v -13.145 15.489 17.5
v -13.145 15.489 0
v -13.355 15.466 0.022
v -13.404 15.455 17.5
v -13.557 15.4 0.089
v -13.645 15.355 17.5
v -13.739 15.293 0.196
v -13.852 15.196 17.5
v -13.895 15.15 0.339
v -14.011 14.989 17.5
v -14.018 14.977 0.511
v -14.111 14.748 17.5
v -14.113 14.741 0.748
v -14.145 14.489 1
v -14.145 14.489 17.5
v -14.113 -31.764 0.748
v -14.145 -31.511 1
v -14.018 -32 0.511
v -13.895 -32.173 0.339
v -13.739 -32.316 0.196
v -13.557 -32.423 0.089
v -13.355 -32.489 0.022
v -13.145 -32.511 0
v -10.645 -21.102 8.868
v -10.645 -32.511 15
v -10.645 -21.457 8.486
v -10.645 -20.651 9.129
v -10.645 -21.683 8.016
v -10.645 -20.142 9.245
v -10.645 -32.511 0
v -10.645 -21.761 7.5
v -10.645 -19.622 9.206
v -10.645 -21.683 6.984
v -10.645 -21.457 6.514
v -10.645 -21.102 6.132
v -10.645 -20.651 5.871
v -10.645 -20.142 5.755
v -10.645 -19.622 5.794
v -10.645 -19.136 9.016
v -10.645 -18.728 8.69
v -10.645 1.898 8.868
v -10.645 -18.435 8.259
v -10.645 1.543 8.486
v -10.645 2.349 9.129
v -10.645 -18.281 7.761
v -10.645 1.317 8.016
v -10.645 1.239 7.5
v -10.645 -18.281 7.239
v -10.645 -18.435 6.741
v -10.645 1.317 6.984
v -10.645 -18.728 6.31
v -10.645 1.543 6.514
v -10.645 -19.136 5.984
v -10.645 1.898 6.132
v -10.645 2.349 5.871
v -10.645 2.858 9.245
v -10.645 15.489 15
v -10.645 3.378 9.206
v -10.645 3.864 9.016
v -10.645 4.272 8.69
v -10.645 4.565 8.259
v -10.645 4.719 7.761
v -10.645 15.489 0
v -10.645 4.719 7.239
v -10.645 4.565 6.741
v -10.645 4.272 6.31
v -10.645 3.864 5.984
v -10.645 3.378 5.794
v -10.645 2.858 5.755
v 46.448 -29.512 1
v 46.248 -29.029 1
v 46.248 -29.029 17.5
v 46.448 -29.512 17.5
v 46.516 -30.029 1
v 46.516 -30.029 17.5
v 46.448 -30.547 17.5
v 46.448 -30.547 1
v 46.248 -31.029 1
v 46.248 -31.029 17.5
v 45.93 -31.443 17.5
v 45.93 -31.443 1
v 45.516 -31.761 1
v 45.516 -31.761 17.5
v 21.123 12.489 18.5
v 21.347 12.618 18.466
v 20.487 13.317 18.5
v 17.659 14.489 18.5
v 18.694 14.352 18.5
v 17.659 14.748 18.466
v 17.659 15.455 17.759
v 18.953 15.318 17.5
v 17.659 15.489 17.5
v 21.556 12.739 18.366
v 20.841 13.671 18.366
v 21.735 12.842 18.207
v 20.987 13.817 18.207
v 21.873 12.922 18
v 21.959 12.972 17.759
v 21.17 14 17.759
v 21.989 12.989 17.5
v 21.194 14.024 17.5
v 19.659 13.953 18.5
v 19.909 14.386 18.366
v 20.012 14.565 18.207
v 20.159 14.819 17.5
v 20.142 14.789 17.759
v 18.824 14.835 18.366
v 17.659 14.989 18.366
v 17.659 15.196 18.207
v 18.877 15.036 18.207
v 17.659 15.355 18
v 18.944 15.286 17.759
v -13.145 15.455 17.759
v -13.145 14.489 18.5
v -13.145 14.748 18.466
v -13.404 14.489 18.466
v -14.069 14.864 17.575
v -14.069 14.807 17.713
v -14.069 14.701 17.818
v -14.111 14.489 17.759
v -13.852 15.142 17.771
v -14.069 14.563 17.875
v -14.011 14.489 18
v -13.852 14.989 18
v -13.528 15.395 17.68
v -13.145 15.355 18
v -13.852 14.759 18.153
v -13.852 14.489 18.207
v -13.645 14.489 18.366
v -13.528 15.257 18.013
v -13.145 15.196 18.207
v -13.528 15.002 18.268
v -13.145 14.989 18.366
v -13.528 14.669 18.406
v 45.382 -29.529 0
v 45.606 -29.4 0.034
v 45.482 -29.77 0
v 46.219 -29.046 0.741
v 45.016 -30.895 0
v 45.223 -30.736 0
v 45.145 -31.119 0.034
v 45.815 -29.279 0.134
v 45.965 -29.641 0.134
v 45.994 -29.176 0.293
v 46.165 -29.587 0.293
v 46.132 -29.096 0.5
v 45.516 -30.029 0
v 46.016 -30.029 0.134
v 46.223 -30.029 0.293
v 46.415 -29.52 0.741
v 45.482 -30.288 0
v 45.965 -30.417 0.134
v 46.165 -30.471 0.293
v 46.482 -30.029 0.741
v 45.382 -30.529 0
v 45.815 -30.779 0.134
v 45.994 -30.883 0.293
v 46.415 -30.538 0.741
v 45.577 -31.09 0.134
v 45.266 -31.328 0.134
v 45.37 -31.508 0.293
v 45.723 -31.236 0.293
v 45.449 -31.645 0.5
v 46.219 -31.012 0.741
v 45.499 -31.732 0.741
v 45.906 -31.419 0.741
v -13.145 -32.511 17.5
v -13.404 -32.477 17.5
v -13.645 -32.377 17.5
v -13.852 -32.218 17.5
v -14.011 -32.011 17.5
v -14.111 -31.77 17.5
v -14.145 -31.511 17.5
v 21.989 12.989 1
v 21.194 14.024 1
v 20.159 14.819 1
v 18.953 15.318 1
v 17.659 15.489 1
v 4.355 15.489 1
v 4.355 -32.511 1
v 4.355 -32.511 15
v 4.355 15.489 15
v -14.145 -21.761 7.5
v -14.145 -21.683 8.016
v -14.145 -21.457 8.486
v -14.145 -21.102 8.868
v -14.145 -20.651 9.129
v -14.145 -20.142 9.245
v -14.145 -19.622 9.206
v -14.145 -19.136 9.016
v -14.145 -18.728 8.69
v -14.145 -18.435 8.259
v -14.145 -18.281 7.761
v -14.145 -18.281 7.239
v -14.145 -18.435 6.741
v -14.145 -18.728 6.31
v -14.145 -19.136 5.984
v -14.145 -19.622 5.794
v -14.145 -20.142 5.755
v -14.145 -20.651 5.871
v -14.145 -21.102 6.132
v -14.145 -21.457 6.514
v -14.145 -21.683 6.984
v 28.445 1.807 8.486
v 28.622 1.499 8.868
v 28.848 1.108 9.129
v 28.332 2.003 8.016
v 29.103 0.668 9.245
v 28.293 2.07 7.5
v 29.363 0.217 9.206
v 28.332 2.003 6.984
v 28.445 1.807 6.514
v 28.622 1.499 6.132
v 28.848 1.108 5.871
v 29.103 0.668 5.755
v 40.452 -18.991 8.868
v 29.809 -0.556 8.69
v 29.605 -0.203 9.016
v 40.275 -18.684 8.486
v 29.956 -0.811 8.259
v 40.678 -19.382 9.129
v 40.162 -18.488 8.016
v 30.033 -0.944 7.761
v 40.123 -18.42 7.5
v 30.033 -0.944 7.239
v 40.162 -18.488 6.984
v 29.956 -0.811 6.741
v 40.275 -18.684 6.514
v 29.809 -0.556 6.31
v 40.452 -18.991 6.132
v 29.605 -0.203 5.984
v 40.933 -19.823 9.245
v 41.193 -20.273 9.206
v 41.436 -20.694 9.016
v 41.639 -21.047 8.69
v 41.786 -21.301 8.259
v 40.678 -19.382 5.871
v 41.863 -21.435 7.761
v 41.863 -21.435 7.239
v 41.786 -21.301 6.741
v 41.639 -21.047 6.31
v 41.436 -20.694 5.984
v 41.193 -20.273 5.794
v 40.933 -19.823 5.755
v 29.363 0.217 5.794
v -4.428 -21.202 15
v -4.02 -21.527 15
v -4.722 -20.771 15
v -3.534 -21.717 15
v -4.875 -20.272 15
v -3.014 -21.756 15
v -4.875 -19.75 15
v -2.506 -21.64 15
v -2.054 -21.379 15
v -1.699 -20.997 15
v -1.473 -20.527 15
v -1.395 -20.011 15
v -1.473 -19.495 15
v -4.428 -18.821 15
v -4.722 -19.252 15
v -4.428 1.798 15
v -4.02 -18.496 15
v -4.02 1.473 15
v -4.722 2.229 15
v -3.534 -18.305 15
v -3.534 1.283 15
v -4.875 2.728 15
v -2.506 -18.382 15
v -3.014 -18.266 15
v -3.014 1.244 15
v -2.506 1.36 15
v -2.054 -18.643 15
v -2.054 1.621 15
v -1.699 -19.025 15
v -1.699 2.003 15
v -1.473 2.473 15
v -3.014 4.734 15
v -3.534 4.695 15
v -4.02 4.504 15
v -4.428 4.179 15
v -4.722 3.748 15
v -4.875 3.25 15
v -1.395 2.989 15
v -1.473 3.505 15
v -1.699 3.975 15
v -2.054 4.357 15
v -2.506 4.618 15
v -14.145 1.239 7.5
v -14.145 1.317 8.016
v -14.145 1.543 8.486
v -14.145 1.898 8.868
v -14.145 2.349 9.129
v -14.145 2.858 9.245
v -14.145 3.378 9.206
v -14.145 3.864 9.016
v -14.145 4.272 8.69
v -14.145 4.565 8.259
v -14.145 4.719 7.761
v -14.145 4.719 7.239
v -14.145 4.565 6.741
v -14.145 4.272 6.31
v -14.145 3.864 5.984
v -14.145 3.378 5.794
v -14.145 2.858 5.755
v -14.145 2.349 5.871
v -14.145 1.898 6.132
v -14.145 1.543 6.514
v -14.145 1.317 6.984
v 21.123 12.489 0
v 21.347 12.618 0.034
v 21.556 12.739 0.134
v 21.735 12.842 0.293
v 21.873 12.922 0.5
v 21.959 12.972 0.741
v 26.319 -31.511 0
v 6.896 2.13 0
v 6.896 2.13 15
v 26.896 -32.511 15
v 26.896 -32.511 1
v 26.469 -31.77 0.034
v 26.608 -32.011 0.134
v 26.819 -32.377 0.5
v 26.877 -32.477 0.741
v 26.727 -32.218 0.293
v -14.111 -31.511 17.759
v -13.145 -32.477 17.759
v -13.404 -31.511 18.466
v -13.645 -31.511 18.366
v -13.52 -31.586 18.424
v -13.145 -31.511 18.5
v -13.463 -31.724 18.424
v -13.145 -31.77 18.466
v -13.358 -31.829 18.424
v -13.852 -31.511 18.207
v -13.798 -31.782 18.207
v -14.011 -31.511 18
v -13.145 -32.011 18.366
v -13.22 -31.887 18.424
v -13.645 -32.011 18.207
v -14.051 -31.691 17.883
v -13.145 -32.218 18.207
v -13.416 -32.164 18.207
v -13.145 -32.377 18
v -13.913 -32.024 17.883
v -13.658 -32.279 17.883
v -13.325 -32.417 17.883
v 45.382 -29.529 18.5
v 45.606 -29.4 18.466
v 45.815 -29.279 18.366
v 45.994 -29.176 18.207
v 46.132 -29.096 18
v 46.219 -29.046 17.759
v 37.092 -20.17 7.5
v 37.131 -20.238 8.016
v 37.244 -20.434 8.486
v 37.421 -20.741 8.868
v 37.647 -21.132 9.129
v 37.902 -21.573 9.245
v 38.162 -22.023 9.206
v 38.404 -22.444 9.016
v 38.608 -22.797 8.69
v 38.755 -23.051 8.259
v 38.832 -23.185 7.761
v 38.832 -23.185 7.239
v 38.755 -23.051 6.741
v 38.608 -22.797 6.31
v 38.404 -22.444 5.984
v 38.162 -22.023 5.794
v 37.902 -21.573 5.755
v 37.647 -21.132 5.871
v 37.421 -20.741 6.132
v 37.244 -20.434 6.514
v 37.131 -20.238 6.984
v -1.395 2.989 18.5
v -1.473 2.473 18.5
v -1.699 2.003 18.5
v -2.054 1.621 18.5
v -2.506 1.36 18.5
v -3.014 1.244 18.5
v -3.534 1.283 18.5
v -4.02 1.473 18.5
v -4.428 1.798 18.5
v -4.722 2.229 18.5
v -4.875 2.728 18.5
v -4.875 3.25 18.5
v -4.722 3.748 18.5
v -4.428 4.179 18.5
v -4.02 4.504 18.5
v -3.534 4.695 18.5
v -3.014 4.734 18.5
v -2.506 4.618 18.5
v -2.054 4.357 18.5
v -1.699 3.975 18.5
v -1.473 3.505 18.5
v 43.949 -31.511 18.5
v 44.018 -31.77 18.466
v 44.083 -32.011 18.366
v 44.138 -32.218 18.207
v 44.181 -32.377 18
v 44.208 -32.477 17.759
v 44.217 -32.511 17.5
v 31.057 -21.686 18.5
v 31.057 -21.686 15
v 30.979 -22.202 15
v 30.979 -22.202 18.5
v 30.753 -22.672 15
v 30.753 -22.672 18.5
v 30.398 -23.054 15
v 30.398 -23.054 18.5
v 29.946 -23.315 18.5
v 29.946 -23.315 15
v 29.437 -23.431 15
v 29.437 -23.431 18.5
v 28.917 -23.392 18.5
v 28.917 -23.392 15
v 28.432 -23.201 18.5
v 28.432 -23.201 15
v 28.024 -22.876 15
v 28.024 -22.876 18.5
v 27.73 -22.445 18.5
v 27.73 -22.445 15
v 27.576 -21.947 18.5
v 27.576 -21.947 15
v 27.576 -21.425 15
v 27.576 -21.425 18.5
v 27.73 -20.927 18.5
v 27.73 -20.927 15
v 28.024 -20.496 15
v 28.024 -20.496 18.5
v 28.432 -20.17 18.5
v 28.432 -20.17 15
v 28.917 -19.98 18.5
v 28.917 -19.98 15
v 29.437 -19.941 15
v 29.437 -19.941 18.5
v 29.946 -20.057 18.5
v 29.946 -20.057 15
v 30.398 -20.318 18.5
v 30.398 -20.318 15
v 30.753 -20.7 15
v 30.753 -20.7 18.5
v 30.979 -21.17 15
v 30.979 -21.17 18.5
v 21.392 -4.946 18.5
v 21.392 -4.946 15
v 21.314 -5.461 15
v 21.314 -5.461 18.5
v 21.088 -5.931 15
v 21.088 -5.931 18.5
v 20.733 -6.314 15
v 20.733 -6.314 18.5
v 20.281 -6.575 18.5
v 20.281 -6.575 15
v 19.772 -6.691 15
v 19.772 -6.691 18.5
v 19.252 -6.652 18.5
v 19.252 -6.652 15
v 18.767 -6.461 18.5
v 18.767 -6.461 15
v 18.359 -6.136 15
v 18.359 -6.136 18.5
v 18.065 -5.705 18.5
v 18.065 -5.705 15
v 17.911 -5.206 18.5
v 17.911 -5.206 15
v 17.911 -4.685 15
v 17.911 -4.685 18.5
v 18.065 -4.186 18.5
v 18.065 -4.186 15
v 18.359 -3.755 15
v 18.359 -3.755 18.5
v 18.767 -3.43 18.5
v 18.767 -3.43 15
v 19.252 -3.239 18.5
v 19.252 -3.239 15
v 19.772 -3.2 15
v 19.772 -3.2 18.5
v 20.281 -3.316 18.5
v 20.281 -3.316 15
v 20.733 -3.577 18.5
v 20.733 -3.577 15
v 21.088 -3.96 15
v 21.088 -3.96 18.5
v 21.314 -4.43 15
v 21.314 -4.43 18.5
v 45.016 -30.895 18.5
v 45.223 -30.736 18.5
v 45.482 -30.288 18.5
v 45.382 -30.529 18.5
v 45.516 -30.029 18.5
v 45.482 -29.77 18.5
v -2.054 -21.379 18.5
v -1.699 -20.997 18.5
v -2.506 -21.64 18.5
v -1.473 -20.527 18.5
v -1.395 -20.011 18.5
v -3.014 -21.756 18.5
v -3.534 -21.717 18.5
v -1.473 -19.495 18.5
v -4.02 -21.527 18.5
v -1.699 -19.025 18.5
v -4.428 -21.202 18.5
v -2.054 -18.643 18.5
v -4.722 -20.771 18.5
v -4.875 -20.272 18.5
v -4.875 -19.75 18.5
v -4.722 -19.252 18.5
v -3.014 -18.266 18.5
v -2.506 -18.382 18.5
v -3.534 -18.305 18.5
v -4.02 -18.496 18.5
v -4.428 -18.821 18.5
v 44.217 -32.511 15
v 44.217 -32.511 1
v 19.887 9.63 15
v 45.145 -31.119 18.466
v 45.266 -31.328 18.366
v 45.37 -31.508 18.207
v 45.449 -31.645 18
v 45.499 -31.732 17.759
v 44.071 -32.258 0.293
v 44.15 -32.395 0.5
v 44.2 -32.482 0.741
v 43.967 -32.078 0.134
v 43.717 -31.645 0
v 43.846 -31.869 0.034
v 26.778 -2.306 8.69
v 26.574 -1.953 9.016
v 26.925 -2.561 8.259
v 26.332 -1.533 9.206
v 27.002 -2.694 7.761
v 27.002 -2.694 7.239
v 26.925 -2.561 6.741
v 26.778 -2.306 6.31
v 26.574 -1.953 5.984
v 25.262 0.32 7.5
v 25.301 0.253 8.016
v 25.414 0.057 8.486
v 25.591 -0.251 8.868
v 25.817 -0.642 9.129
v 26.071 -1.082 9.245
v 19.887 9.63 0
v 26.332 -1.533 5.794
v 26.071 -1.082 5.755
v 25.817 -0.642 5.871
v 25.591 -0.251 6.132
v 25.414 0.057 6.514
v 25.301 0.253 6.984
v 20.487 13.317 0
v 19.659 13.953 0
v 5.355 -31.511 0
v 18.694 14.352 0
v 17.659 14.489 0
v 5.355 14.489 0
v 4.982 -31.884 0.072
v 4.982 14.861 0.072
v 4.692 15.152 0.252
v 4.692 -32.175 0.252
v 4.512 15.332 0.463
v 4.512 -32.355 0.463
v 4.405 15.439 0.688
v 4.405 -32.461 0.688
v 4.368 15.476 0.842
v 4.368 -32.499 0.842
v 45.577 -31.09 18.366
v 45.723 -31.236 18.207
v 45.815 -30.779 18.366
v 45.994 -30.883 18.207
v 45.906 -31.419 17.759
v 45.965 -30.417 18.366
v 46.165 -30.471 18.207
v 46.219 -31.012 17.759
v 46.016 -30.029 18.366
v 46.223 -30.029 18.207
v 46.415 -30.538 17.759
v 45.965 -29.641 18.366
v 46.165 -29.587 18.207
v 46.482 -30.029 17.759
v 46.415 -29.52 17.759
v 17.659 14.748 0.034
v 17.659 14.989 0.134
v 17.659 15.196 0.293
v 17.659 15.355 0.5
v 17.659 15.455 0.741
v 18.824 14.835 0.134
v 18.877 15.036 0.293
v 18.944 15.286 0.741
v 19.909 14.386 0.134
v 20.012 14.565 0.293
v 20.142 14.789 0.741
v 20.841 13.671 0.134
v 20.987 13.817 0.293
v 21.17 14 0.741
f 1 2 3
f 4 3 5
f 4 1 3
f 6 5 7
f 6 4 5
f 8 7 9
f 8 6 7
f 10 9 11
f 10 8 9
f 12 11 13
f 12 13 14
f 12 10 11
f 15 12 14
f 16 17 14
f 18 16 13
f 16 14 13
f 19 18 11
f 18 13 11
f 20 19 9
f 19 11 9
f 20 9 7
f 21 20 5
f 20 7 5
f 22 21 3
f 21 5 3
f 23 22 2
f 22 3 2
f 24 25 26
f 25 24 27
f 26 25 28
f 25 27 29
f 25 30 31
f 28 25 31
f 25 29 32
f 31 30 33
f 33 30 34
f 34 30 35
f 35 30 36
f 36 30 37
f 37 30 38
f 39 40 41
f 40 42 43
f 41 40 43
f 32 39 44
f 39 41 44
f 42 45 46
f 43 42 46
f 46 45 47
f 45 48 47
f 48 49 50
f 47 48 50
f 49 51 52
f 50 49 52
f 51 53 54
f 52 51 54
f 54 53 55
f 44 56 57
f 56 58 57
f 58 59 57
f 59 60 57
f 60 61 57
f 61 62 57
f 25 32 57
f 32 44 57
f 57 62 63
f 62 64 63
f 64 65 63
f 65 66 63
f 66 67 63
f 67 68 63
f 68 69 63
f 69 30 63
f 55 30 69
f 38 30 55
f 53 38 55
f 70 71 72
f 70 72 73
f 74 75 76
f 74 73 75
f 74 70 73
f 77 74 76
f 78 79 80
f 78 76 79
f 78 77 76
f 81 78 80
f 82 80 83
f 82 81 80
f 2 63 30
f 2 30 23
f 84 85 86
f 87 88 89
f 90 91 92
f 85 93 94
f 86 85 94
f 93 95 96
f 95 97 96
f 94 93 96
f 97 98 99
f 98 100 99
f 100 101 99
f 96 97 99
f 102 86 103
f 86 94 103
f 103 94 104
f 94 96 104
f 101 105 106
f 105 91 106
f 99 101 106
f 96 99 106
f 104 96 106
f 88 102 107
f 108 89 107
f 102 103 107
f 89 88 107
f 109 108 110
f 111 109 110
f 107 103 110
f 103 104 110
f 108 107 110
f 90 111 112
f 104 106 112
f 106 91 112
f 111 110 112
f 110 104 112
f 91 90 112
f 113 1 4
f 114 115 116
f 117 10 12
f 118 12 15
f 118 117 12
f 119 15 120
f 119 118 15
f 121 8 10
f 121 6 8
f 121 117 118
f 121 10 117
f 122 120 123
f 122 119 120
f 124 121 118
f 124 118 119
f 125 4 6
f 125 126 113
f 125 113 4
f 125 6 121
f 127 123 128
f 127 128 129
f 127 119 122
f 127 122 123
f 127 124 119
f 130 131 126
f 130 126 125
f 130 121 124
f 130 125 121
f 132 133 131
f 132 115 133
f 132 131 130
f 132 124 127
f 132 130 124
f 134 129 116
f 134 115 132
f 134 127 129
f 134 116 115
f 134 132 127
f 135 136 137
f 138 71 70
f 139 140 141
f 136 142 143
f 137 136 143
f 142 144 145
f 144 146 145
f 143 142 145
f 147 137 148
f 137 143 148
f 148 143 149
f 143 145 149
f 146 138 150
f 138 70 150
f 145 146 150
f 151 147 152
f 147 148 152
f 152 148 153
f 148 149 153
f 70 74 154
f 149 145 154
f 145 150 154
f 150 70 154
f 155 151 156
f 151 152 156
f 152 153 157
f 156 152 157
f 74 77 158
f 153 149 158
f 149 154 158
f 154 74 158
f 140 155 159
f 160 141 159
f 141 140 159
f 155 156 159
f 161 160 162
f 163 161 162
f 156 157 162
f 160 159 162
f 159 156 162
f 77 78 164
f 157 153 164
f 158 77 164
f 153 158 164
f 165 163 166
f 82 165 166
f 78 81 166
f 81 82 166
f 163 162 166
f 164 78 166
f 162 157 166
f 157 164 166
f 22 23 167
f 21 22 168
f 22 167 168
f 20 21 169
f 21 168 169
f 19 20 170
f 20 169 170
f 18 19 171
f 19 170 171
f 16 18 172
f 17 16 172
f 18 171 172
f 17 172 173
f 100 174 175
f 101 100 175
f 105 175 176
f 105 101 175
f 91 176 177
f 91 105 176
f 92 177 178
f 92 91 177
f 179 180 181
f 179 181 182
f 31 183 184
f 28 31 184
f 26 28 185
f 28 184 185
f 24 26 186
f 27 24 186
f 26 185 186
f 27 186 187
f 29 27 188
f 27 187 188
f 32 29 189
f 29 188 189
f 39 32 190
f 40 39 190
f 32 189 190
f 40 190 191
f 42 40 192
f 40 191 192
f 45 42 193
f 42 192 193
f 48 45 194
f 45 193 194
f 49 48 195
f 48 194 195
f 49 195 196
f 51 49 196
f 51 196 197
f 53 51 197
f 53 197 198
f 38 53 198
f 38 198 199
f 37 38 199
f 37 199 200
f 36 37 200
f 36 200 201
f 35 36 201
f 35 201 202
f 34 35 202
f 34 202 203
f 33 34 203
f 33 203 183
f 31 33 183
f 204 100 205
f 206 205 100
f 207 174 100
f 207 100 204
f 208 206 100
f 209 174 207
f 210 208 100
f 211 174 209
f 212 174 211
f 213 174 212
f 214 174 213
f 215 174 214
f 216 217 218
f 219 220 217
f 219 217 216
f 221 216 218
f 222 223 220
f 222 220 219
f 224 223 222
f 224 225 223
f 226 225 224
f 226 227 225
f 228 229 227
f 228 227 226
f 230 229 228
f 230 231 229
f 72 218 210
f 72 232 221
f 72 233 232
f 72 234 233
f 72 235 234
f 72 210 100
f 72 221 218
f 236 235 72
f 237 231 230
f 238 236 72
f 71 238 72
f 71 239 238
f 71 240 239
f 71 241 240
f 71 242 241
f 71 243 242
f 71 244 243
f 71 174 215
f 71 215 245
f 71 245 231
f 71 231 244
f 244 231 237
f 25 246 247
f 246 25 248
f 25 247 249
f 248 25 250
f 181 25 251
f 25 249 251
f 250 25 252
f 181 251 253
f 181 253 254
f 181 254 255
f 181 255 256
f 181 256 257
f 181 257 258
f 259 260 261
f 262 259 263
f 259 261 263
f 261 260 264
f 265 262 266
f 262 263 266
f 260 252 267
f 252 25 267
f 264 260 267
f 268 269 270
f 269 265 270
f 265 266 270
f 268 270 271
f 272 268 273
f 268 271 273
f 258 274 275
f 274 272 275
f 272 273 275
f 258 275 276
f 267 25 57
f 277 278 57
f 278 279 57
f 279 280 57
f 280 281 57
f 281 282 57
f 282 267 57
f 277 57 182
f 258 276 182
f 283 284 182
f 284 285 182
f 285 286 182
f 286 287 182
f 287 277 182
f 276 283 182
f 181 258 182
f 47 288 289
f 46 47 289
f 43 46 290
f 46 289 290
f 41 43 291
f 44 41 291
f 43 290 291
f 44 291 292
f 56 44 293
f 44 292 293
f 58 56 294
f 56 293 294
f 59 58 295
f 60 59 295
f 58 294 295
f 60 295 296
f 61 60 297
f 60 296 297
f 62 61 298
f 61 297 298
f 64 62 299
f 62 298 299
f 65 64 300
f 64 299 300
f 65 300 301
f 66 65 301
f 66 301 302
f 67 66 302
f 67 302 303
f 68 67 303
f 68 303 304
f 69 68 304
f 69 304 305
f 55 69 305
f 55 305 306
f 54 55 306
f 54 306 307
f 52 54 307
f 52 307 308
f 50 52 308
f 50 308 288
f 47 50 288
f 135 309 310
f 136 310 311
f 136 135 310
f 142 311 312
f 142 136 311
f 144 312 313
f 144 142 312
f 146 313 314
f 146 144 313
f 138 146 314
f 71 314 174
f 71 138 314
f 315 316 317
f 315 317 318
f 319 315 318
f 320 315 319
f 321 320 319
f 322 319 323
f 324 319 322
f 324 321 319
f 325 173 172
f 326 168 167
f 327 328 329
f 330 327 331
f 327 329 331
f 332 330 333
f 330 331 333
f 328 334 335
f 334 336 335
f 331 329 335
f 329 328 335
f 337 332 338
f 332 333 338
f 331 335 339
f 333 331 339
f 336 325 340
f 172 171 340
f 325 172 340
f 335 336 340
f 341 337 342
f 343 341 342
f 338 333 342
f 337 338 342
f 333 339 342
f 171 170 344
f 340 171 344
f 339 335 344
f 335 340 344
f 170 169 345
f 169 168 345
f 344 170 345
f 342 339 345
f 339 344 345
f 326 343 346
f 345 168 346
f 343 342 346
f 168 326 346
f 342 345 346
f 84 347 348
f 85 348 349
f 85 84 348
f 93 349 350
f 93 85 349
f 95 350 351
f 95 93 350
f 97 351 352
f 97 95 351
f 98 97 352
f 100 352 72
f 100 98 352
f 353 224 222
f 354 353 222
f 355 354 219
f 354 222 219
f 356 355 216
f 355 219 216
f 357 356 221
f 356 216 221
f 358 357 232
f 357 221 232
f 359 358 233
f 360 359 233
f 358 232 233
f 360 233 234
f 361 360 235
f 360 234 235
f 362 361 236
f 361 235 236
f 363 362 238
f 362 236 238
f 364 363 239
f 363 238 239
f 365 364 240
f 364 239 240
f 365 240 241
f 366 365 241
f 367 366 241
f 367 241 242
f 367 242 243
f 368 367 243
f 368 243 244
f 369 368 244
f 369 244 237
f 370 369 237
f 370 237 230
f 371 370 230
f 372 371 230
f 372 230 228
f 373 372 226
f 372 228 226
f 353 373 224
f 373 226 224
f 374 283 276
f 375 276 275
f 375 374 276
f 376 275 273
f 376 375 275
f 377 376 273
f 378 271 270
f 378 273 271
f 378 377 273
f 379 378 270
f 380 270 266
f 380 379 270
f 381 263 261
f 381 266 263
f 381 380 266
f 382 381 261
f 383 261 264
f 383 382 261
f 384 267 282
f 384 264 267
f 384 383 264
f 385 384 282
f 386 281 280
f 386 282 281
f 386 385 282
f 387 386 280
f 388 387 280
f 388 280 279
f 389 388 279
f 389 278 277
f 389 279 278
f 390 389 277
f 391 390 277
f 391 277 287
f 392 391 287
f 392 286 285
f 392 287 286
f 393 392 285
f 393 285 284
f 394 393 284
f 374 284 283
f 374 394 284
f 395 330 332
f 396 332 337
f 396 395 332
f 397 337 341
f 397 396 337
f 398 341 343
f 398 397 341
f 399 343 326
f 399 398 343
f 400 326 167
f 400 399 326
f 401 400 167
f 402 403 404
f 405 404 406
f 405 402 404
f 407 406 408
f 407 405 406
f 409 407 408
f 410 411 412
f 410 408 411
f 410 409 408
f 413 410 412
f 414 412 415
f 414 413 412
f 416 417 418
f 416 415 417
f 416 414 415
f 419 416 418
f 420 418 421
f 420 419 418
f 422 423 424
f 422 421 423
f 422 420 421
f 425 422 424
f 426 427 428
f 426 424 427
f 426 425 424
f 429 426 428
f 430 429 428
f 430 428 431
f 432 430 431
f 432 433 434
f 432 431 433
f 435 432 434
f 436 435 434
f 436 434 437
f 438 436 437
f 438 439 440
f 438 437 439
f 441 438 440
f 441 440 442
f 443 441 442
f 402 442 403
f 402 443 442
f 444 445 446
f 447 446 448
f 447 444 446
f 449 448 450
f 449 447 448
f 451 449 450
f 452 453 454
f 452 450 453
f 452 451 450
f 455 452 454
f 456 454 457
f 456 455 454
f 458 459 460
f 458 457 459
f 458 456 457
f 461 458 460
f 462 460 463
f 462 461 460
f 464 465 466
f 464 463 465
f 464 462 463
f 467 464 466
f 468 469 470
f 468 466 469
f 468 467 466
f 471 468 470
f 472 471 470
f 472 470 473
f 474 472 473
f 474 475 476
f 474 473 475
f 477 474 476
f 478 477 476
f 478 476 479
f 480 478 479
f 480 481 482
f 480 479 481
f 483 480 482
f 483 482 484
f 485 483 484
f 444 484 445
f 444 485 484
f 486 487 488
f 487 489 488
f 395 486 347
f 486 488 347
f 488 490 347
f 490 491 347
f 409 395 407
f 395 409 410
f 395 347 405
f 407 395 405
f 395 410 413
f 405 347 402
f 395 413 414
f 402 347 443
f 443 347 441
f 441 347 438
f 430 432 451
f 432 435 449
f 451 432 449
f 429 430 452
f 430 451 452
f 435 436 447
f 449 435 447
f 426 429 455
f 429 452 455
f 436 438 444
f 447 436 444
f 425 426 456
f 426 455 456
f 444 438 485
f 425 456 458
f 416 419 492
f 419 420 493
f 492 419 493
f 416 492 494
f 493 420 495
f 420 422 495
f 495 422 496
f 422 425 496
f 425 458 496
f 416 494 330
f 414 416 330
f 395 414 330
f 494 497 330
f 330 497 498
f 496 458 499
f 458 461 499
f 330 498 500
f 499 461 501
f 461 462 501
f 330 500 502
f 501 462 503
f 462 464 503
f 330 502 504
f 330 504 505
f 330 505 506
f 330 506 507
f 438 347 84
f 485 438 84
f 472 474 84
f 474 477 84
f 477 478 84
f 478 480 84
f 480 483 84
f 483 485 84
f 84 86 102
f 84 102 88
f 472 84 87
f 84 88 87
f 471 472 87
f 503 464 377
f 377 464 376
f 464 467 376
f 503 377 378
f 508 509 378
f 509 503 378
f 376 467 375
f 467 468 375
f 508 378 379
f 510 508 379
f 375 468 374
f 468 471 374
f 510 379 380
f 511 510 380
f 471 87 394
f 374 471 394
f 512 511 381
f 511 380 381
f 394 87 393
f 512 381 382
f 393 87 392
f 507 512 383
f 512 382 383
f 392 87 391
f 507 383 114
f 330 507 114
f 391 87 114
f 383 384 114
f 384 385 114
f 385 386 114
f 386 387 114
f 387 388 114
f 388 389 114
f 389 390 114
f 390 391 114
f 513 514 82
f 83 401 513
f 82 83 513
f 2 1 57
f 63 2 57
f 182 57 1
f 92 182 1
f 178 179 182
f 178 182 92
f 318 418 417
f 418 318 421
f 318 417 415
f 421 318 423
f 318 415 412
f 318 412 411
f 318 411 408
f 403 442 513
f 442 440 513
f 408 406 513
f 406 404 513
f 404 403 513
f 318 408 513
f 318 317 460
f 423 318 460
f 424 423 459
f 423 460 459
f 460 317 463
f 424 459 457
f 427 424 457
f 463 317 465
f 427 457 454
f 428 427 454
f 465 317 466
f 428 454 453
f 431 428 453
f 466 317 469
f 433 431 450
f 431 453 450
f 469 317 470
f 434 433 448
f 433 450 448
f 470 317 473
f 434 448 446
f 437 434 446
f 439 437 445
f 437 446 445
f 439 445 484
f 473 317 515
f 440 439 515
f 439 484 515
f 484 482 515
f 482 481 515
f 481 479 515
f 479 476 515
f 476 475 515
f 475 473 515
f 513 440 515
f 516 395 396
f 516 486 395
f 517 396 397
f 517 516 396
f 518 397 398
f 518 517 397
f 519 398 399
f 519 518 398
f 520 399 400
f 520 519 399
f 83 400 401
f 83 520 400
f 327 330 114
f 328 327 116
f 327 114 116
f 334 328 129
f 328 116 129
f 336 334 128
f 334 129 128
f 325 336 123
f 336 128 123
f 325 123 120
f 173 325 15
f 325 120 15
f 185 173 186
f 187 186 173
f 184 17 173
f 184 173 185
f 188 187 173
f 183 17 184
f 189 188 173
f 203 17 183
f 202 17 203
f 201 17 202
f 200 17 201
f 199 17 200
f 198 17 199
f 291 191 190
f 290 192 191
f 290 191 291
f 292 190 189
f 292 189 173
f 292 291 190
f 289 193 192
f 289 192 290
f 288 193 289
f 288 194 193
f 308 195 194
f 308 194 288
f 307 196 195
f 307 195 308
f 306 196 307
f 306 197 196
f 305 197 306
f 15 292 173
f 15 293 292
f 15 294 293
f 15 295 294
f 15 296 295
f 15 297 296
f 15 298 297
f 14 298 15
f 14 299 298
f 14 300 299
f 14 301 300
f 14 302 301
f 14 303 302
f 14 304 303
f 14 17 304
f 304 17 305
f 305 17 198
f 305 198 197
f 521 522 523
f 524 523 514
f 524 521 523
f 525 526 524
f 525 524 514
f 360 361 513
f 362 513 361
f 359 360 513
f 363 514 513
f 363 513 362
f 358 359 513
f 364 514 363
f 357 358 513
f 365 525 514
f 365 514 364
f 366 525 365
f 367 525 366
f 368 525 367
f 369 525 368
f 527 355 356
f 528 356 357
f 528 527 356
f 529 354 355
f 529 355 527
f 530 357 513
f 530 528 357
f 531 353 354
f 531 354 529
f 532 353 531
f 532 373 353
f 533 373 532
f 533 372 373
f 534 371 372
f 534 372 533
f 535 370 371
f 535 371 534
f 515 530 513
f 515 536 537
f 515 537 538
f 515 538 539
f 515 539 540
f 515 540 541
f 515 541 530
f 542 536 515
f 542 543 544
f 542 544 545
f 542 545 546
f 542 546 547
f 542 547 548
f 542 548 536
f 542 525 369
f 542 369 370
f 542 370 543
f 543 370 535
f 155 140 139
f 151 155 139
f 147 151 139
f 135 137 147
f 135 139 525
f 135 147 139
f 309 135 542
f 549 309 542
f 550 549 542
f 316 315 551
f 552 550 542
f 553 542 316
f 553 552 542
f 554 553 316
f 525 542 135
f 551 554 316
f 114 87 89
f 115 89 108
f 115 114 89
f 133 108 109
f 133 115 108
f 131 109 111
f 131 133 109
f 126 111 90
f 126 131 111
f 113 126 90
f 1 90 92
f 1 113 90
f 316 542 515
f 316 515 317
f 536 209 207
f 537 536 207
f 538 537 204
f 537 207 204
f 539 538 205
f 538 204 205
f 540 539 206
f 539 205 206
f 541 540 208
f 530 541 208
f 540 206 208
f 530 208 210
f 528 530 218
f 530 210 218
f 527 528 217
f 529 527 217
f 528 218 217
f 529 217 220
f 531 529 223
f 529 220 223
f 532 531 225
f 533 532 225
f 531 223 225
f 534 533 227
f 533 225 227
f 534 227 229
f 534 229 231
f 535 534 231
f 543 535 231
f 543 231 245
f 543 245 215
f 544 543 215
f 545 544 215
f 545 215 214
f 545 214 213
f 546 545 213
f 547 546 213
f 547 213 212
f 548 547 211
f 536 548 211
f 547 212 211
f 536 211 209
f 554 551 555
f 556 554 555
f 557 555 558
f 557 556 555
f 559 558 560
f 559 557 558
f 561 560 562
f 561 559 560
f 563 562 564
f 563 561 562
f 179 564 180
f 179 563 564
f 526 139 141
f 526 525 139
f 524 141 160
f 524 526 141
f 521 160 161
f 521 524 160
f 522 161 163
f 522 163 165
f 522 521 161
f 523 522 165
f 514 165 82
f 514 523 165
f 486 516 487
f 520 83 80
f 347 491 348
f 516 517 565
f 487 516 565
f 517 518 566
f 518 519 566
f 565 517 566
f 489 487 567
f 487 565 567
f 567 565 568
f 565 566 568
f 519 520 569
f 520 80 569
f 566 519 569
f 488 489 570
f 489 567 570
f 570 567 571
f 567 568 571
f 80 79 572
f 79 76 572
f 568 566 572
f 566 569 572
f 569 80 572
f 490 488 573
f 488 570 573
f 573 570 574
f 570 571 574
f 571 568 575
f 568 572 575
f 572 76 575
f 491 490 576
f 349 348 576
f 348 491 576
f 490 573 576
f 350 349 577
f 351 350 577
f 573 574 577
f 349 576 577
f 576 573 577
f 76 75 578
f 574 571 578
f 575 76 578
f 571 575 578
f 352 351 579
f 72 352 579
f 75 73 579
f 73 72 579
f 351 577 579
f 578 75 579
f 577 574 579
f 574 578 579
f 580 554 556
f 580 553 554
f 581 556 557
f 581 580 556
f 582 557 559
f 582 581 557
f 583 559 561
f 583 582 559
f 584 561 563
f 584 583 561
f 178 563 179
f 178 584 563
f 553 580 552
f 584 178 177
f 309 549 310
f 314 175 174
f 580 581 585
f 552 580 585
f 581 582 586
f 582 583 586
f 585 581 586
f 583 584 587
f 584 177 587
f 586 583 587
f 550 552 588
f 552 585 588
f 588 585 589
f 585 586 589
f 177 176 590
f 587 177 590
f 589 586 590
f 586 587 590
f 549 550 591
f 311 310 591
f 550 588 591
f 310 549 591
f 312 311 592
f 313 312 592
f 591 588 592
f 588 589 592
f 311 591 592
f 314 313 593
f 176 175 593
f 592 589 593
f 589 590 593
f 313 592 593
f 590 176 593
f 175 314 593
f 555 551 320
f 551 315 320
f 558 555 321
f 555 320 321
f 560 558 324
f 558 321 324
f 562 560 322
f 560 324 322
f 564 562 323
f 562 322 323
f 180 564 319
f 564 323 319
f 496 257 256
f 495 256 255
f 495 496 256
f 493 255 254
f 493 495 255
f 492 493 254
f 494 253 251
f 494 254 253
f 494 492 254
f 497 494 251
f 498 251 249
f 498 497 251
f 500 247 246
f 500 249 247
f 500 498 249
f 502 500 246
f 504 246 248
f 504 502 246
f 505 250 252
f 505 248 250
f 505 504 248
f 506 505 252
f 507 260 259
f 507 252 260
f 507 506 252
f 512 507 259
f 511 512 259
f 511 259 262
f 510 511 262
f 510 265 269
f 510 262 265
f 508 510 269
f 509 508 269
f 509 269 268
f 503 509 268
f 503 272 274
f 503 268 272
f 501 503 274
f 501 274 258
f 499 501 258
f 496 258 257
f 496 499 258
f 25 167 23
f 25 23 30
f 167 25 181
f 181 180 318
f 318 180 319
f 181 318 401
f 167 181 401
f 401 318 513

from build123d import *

# Parameters (mm, degrees)
BOSS_EXTRUDE1_DEPTH = 18.5
SKETCH2_W           = 15
SKETCH2_H           = 48
CUT_EXTRUDE1_DEPTH  = 15
SKETCH3_R           = 1.75
CUT_EXTRUDE2_DEPTH  = 3.5
SKETCH4_R           = 1.75
CUT_EXTRUDE3_DEPTH  = 4
SKETCH5_R           = 1.75
CUT_EXTRUDE4_DEPTH  = 4
CUT_EXTRUDE5_DEPTH  = 19
FILLET1_R           = 2
FILLET2_R           = 5
FILLET3_R           = 1


with BuildPart() as part:
    # Sketch1 → Boss-Extrude1 (new body)
    with BuildSketch(Plane.XY):
        Polygon((20.545588903, 15.488794989), (48.258401824, -32.511205011), (7.85498998, -32.511205011), (-14.14501002, -32.511205011), (-14.14501002, 15.488794989), align=None)
    extrude(amount=BOSS_EXTRUDE1_DEPTH)

    # Sketch2 → Cut-Extrude1 (cut)
    with BuildSketch(Plane.XY):
        with Locations((-3.14501002, -8.511205011)):
            Rectangle(SKETCH2_W, SKETCH2_H)
        Polygon((44.21694994, -32.511205011), (19.886822921, 9.62981114), (6.896441864, 2.12981114), (26.896441864, -32.511205011), align=None)
    extrude(amount=CUT_EXTRUDE1_DEPTH, mode=Mode.SUBTRACT)

    # Sketch3 → Cut-Extrude2 (cut)
    with BuildSketch(Plane(origin=(22.116036645, 12.76869971, 0), x_dir=(0, 0, -1), z_dir=(0.8660254037844378, 0.5000000000000016, 0))):
        with Locations(Location((-7.5, -37.764004417, 0), (0, 0, 90))):
            Circle(SKETCH3_R)
        with Locations(Location((-7.5, -14.103750379, 0), (0, 0, 90))):
            Circle(SKETCH3_R)
    extrude(amount=-CUT_EXTRUDE2_DEPTH, mode=Mode.SUBTRACT)

    # Sketch4 → Cut-Extrude3 (cut)
    with BuildSketch(Plane(origin=(0, 0, 18.5), x_dir=(-1, 0, 0), z_dir=(0, 0, -1))):
        with Locations(Location((-29.306695902, -21.685887464, 0), (0, 0, 180))):
            Circle(SKETCH4_R)
        with Locations(Location((-19.641632393, -4.945506407, 0), (0, 0, 180))):
            Circle(SKETCH4_R)
        with Locations(Location((3.14501002, 2.988794989, 0), (0, 0, 180))):
            Circle(SKETCH4_R)
        with Locations(Location((3.14501002, -20.011205011, 0), (0, 0, 180))):
            Circle(SKETCH4_R)
    extrude(amount=CUT_EXTRUDE3_DEPTH, mode=Mode.SUBTRACT)

    # Sketch5 → Cut-Extrude4 (cut)
    with BuildSketch(Plane.ZY.offset(14.14501002)):
        with Locations(Location((7.5, -20.011205011, 0), (0, 0, 270))):
            Circle(SKETCH5_R)
        with Locations(Location((7.5, 2.988794989, 0), (0, 0, 270))):
            Circle(SKETCH5_R)
    extrude(amount=-CUT_EXTRUDE4_DEPTH, mode=Mode.SUBTRACT)

    # Sketch6 → Cut-Extrude5 (cut)
    with BuildSketch(Plane.XY.offset(18.5)):
        Polygon((44.21694994, -32.511205011), (47.248038853, -30.761205011), (48.258401824, -32.511205011), align=None)
    extrude(amount=-CUT_EXTRUDE5_DEPTH, mode=Mode.SUBTRACT)

    # Fillet1
    fillet1_edges = [part.edges().sort_by_distance(p)[0] for p in [
        (47.248038853, -30.761205011, 9.25),
    ]]
    fillet(fillet1_edges, radius=FILLET1_R)

    # Fillet2
    fillet2_edges = [part.edges().sort_by_distance(p)[0] for p in [
        (20.545588903, 15.488794989, 9.25),
    ]]
    fillet(fillet2_edges, radius=FILLET2_R)

    # Fillet3
    fillet3_edges = [part.edges().sort_by_distance(p)[0] for p in [
        (44.866468993, -32.136205011, 0),
        (46.447839698, -30.546792294, 0),
        (11.006913769, 15.488794989, 0),
        (20.158837557, 14.818922008, 0),
        (44.866468993, -32.136205011, 18.5),
        (46.447839698, -30.546792294, 18.5),
        (1.756913769, 15.488794989, 18.5),
        (20.158837557, 14.818922008, 18.5),
        (-14.14501002, 15.488794989, 9.25),
        (-14.14501002, -32.511205011, 9.25),
        (-14.14501002, -8.511205011, 0),
        (15.625715922, -32.511205011, 0),
        (4.35498998, -8.511205011, 0),
        (34.118501715, -8.020179607, 0),
        (-14.14501002, -8.511205011, 18.5),
        (15.03596996, -32.511205011, 18.5),
        (34.118501715, -8.020179607, 18.5),
    ]]
    fillet(fillet3_edges, radius=FILLET3_R)


solid = part.part
